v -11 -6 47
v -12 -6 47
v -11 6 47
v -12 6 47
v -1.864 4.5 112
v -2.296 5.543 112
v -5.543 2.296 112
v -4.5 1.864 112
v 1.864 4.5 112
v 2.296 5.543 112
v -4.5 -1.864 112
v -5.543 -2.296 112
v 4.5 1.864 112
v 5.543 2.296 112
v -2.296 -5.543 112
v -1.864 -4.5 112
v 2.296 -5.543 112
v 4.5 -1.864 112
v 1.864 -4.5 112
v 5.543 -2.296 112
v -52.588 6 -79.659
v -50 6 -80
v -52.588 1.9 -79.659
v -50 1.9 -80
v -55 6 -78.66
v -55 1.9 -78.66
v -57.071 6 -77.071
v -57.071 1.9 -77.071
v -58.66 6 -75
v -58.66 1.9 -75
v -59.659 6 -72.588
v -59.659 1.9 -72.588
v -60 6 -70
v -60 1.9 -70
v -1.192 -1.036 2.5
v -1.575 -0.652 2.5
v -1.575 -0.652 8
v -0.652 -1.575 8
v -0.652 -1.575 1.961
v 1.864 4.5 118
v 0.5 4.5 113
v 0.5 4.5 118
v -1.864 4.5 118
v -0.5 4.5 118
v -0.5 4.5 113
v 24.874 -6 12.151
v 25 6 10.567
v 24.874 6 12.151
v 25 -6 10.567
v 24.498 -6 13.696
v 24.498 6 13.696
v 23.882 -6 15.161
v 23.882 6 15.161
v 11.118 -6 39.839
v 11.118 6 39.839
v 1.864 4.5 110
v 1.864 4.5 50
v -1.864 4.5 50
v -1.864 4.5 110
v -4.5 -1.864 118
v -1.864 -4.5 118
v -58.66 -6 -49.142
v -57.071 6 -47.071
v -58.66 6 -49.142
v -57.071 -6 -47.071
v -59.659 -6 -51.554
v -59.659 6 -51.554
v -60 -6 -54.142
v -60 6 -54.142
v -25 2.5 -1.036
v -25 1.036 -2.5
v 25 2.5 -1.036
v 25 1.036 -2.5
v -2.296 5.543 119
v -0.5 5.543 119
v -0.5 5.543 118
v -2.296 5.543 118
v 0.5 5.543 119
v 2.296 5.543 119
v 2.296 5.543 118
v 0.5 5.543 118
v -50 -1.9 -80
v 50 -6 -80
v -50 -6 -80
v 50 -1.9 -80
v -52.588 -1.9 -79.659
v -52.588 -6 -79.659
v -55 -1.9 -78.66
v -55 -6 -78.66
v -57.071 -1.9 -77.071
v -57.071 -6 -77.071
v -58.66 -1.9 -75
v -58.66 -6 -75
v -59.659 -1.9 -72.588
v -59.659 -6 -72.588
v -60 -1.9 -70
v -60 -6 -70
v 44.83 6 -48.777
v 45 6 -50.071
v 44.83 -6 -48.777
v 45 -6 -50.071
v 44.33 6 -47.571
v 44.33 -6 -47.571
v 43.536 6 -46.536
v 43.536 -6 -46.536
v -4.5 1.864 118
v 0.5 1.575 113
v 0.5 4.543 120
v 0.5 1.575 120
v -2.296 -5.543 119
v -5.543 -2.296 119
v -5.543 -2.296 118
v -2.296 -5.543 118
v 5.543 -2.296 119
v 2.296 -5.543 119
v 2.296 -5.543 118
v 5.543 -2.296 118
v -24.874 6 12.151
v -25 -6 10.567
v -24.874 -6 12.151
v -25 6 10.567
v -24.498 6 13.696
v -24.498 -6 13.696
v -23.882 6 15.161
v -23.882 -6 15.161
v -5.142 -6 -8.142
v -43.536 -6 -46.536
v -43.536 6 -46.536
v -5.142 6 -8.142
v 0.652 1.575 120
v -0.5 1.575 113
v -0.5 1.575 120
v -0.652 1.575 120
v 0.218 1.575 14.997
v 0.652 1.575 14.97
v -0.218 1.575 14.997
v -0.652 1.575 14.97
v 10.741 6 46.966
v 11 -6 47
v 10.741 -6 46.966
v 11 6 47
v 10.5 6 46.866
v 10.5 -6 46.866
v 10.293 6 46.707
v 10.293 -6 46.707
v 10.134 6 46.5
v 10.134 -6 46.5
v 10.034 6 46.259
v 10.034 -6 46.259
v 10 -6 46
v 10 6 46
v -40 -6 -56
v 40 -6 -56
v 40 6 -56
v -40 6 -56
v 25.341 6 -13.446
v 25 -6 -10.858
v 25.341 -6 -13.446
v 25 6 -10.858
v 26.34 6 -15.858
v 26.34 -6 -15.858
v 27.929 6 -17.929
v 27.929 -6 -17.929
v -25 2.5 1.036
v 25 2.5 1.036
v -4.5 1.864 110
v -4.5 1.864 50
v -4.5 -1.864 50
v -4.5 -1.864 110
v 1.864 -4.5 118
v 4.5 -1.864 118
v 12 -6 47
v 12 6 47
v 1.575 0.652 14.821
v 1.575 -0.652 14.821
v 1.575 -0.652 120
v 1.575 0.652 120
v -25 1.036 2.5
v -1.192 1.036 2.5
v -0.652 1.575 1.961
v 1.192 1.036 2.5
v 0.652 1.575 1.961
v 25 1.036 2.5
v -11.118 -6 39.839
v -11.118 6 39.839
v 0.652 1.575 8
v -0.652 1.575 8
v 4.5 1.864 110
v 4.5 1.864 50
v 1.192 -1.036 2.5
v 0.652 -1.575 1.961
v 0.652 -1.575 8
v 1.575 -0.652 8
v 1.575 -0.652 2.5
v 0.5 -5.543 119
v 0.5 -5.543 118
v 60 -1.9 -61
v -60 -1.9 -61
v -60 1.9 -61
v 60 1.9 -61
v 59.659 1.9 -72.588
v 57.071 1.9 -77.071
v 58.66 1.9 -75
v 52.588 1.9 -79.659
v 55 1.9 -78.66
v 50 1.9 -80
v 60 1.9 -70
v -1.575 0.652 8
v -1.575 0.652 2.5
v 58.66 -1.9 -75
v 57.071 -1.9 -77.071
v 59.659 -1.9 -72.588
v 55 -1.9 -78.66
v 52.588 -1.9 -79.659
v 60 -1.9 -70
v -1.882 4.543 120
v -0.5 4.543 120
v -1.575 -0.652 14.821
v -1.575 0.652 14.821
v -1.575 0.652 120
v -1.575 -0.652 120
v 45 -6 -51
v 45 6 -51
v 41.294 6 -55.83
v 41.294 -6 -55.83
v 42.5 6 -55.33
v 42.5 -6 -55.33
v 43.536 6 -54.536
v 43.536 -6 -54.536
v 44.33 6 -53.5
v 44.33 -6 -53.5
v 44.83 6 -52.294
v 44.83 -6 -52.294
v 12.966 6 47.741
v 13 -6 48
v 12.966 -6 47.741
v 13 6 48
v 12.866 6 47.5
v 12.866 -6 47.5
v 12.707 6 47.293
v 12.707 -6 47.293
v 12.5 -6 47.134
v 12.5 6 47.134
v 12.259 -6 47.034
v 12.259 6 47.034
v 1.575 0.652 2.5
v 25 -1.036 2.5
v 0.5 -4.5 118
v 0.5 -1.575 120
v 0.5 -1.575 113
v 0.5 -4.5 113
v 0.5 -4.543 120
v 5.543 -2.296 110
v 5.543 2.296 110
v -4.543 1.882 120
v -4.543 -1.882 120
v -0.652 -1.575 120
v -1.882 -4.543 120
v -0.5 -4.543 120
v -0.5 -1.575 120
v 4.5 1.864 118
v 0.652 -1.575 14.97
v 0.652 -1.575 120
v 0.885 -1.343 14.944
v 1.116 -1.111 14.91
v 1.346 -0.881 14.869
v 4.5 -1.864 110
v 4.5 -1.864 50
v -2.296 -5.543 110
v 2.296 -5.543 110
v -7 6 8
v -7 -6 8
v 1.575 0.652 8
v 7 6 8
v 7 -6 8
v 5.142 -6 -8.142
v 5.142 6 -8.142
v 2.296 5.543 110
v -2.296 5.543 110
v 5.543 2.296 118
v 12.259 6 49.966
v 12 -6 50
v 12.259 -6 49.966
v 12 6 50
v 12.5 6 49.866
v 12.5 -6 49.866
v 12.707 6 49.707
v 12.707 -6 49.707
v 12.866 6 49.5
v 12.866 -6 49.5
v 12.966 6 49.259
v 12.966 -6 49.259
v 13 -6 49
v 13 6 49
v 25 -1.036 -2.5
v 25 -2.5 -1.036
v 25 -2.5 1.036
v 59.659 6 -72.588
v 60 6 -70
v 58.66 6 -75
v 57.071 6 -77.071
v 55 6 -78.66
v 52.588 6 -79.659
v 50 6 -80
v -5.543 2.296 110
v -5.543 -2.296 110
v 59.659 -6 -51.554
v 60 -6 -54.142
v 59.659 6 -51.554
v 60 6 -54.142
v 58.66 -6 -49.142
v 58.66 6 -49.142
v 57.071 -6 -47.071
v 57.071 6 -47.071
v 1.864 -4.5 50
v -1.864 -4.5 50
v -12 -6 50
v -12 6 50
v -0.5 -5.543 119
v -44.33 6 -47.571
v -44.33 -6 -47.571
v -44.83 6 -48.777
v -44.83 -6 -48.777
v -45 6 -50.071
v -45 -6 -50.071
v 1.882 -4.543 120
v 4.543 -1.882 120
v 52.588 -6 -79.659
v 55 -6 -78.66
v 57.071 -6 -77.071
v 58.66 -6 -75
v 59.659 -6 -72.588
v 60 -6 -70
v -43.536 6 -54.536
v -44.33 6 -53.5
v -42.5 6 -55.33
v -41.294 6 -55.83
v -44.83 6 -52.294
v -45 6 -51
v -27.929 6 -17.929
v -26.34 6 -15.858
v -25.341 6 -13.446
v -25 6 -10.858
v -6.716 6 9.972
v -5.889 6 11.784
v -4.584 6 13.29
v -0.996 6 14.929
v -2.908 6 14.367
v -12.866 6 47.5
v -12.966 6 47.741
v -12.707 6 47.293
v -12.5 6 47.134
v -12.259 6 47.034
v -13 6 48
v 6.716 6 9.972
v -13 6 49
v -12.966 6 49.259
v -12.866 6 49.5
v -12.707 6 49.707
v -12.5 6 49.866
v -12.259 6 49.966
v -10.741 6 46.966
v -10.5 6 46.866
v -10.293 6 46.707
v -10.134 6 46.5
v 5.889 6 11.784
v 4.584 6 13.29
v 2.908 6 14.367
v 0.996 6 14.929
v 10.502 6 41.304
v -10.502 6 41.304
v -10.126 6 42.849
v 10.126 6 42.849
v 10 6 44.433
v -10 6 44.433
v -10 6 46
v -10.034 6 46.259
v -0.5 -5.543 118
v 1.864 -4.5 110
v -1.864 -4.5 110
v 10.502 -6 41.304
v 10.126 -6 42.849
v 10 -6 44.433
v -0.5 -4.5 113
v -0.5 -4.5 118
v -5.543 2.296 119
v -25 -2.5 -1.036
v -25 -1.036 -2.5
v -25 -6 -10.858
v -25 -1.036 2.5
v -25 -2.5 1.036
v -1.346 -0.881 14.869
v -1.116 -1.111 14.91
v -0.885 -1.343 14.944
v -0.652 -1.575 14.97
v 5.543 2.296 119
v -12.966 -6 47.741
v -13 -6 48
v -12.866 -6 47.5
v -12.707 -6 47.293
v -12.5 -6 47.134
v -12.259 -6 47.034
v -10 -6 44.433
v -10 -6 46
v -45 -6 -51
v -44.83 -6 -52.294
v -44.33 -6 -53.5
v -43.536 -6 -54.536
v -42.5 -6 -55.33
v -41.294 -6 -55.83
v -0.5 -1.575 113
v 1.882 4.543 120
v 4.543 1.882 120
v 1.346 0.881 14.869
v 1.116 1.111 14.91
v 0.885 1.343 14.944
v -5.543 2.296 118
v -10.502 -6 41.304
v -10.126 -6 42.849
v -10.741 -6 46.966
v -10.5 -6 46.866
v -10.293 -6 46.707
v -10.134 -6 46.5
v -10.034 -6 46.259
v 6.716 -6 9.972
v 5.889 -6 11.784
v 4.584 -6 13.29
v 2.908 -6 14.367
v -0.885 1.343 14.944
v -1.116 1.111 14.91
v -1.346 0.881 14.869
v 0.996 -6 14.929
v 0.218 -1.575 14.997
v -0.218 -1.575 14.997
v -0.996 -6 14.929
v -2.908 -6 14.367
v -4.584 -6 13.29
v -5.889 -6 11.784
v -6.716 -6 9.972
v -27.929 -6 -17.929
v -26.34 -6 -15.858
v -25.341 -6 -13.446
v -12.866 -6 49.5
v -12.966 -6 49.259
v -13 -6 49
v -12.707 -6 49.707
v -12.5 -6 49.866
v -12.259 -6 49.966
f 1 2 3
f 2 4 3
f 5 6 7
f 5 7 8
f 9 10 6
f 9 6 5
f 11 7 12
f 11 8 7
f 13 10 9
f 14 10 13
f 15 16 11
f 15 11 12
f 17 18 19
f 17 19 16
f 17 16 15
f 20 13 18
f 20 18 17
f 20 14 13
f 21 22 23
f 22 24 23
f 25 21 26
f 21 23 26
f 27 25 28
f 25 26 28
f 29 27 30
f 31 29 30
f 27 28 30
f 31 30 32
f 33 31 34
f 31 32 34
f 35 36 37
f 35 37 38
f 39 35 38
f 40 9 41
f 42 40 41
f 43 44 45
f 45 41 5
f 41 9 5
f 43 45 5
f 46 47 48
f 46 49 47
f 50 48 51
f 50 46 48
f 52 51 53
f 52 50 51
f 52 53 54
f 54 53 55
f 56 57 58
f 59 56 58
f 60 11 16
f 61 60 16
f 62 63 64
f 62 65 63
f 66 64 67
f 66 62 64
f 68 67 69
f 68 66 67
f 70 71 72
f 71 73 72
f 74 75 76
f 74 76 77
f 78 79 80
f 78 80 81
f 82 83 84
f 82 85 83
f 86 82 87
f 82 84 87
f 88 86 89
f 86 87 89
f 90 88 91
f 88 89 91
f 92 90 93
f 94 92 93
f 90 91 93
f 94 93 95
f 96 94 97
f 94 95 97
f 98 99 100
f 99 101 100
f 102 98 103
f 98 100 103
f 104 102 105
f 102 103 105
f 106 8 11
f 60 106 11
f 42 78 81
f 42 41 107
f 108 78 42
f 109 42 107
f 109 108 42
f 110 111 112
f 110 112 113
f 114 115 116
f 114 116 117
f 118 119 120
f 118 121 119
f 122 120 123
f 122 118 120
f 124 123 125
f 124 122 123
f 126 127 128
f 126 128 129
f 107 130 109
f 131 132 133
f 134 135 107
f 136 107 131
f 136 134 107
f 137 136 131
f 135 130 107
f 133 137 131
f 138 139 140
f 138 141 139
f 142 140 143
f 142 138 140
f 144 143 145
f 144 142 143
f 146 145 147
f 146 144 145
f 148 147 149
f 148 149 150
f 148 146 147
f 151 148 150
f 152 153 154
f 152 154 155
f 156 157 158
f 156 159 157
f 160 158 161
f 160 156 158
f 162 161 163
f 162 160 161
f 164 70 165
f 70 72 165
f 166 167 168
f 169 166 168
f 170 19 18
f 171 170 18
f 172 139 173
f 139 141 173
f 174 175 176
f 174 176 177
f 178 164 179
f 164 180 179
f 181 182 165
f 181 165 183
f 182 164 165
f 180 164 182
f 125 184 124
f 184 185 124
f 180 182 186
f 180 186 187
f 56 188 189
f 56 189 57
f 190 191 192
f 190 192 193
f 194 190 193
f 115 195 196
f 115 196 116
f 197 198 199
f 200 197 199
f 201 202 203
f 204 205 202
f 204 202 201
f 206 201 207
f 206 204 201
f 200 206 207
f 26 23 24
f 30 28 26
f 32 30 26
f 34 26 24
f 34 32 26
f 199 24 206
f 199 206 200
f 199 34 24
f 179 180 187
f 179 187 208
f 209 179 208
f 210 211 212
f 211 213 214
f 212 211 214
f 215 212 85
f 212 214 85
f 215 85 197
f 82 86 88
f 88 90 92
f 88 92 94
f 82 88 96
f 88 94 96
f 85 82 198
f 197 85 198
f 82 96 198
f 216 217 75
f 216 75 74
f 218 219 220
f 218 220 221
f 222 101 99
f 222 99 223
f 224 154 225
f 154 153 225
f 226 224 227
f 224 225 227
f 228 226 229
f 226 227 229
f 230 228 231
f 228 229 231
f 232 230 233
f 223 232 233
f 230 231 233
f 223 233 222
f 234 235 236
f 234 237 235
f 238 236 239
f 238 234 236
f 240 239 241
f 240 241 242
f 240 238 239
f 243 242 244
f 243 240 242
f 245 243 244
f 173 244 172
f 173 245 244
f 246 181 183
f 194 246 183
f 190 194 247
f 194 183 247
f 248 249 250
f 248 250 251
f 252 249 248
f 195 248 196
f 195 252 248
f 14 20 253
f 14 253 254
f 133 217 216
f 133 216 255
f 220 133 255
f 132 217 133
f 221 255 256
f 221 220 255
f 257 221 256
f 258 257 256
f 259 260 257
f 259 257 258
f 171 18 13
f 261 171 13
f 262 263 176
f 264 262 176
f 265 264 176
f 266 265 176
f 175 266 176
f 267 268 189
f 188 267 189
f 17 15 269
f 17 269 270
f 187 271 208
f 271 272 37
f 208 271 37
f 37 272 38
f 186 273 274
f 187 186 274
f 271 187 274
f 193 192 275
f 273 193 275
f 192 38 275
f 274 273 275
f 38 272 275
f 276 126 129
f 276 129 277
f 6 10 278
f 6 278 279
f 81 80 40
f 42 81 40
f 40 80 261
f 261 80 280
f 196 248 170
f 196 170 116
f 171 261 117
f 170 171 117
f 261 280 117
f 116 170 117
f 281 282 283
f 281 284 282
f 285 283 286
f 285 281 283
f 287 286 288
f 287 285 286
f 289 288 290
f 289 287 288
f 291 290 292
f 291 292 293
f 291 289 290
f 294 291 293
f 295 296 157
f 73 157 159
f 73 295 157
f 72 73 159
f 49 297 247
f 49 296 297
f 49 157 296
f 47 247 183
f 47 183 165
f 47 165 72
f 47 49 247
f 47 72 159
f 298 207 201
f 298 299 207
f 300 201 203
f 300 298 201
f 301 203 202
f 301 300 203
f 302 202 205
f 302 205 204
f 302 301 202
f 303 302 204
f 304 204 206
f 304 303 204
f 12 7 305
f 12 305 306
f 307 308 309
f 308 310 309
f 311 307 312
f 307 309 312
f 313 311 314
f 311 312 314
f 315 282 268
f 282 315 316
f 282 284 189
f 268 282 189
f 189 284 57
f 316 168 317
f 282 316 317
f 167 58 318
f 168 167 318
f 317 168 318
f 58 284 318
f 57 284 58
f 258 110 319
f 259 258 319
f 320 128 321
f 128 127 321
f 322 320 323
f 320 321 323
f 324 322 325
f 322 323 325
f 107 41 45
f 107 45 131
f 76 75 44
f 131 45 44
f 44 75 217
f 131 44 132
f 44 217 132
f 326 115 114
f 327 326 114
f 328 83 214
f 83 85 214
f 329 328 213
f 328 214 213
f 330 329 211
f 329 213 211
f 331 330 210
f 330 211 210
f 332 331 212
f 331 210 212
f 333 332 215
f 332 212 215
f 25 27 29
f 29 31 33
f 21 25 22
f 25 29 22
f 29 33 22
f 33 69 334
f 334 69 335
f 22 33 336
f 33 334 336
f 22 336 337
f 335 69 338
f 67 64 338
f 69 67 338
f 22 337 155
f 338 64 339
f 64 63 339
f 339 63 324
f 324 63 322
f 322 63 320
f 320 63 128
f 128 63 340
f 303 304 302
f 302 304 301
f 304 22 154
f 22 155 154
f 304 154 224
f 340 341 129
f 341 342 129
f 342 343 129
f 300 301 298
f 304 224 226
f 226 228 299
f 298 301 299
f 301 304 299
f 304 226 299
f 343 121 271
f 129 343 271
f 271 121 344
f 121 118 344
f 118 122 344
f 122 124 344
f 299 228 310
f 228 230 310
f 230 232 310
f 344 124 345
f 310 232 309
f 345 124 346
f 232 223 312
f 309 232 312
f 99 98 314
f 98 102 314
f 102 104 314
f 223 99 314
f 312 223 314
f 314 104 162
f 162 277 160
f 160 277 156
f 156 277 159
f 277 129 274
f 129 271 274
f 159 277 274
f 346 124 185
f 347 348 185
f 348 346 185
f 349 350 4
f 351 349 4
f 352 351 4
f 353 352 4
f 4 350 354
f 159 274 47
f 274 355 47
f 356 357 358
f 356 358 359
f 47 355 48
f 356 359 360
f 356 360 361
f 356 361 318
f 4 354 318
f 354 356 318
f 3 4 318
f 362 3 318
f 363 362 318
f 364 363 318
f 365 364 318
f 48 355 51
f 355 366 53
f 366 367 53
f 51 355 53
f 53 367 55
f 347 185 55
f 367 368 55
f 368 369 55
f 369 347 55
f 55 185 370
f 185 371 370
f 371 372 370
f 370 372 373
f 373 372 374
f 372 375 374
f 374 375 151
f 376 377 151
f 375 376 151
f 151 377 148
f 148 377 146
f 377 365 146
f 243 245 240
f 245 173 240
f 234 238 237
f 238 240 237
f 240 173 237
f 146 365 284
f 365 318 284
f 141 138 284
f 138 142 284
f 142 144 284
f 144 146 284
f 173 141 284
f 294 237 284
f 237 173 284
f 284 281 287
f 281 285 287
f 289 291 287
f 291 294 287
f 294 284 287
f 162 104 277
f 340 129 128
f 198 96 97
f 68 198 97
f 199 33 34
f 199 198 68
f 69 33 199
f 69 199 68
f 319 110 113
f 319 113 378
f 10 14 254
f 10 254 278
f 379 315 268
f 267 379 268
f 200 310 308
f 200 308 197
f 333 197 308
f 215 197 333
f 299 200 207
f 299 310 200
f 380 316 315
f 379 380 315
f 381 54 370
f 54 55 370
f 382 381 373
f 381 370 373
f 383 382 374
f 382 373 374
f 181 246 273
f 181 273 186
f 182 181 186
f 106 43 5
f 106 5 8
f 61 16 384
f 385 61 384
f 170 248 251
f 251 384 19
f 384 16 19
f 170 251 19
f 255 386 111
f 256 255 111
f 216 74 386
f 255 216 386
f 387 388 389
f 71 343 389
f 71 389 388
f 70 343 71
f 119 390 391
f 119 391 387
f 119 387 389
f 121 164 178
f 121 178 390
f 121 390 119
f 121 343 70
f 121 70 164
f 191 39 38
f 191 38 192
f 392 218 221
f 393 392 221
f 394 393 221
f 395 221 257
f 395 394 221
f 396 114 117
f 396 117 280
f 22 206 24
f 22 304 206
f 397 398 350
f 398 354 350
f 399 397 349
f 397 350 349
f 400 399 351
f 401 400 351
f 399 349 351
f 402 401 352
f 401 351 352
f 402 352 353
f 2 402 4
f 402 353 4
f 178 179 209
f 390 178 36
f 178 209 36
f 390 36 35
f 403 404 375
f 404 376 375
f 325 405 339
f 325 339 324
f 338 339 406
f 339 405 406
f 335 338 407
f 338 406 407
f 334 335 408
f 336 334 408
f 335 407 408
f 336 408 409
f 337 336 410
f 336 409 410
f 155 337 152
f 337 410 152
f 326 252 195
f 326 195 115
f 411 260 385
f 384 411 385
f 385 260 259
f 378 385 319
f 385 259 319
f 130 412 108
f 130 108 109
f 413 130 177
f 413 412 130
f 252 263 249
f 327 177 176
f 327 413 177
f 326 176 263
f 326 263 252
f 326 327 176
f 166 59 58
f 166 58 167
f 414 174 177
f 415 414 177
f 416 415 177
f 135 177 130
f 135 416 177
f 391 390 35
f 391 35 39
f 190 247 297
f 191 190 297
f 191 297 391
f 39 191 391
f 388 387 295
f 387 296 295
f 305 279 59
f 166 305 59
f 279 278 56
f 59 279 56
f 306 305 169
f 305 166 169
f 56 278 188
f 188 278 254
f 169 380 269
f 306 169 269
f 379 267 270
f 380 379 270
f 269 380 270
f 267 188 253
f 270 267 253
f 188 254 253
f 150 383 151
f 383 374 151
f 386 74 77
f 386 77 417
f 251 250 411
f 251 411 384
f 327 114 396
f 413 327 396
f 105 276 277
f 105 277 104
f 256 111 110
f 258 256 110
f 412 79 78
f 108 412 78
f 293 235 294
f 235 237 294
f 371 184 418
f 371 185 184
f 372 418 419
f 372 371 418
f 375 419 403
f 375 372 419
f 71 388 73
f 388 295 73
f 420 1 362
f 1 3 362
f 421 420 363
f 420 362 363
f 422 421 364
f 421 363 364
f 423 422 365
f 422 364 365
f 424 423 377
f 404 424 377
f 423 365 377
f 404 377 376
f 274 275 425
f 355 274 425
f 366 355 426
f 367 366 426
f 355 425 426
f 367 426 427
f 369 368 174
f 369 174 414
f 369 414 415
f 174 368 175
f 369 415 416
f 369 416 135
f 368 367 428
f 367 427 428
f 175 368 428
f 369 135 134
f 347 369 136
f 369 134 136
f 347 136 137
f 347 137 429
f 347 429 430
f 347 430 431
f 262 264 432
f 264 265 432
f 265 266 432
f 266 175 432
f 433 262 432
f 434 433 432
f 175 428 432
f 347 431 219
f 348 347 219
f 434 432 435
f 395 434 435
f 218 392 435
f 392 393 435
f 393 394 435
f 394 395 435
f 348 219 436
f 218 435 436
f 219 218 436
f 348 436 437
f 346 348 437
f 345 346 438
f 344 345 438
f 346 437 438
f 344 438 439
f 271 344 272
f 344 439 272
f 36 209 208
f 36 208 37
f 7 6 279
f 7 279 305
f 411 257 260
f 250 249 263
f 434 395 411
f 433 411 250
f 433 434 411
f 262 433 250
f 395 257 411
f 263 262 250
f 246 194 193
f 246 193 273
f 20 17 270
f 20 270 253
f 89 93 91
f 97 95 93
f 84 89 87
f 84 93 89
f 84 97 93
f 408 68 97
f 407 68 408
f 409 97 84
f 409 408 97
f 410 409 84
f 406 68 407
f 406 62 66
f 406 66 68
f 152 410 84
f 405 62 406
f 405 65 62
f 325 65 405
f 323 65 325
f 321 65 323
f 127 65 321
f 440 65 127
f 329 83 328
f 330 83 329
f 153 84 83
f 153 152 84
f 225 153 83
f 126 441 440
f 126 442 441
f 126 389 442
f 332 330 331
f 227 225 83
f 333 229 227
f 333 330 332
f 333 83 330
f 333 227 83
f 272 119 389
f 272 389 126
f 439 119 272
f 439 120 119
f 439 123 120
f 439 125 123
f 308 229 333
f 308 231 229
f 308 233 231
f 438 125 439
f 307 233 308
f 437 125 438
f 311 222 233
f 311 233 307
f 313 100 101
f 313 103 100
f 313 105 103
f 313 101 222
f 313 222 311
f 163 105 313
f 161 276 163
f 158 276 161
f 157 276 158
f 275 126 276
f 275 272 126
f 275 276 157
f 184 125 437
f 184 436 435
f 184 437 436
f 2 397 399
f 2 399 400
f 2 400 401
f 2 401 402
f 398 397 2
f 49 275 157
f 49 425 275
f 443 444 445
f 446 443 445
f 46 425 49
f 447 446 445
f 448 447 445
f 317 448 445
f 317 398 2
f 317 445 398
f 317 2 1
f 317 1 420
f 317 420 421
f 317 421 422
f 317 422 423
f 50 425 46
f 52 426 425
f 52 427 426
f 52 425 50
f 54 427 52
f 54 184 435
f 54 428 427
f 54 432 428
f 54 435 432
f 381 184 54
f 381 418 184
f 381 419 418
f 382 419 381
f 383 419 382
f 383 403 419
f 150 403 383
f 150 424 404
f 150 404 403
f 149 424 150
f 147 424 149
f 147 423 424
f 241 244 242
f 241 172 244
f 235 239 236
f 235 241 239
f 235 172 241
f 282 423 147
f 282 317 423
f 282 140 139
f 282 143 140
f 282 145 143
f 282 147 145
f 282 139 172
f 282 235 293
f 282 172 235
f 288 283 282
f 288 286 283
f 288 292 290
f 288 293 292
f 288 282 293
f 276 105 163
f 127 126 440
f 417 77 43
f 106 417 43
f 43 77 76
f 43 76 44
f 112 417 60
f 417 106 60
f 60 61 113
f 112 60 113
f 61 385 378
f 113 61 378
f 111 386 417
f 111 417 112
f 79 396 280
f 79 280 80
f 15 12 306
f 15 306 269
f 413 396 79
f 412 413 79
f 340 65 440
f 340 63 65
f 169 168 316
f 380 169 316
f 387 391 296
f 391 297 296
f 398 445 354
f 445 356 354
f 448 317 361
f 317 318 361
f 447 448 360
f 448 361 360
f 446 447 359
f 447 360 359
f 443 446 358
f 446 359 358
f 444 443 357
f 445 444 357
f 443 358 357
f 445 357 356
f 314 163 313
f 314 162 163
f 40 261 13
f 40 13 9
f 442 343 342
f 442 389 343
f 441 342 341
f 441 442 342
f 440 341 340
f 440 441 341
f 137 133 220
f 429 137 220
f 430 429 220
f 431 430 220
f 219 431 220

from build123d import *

# Parameters (mm, degrees)
PAD_DEPTH            = 25
PAD_DEPTH_BACK       = 25
PAD001_START         = 5
PAD001_DEPTH         = 115
PAD002_DEPTH         = 6
PAD002_DEPTH_BACK    = 6
POCKET_DEPTH         = 10.001
POCKET_DEPTH_BACK    = 10.001
POCKET001_DEPTH      = 120.001
PAD003_DEPTH         = 2
LINEARPATTERN_COUNT  = 2
LINEARPATTERN_PITCH  = 8
SKETCH006_W          = 15
SKETCH006_H          = 1
POCKET002_DEPTH      = 7
PAD004_DEPTH         = 6
PAD004_DEPTH_BACK    = 6
SKETCH008_W          = 3.8
SKETCH008_H          = 20
POCKET003_DEPTH      = 60.001
POCKET003_DEPTH_BACK = 60.001
POCKET004_DEPTH      = 10.001
POCKET004_DEPTH_BACK = 10.001
FILLET_R             = 10
FILLET001_R          = 10
FILLET002_R          = 5
FILLET003_R          = 10
FILLET004_R          = 1
FILLET005_R          = 1
SKETCH010_W          = 10
SKETCH010_H          = 30
POCKET005_DEPTH      = 60.001
POCKET005_DEPTH_BACK = 60.001
SKETCH011_W          = 10
SKETCH011_H          = 30
POCKET006_DEPTH      = 60.001
POCKET006_DEPTH_BACK = 60.001
FILLET006_R          = 10
CHAMFER_SIZE         = 1
CHAMFER001_SIZE      = 1


with BuildPart() as part:
    # Sketch → Pad (new body, two sides)
    with BuildSketch(Plane.YZ) as pad_sk:
        Polygon((10, -4.142136), (10, 4.142136), (4.142136, 10), (-4.142136, 10), (-10, 4.142136), (-10, -4.142136), (-4.142136, -10), (4.142136, -10), align=None)
        Polygon((2.5, 1.035534), (1.035534, 2.5), (-1.035534, 2.5), (-2.5, 1.035534), (-2.5, -1.035534), (-1.035534, -2.5), (1.035534, -2.5), (2.5, -1.035534), align=None, mode=Mode.SUBTRACT)
    extrude(amount=PAD_DEPTH)
    extrude(pad_sk.sketch, amount=-PAD_DEPTH_BACK)

    # Sketch001 → Pad001 (join)
    with BuildSketch(Plane.XY.offset(PAD001_START)):
        Polygon((4.5, -1.863961), (4.5, 1.863961), (1.863961, 4.5), (-1.863961, 4.5), (-4.5, 1.863961), (-4.5, -1.863961), (-1.863961, -4.5), (1.863961, -4.5), align=None)
        Polygon((1.575, -0.652386), (1.575, 0.652386), (0.652386, 1.575), (-0.652386, 1.575), (-1.575, 0.652386), (-1.575, -0.652386), (-0.652386, -1.575), (0.652386, -1.575), align=None, mode=Mode.SUBTRACT)
    extrude(amount=PAD001_DEPTH)

    # Sketch002 → Pad002 (join, two sides)
    with BuildSketch(Plane.XZ) as pad002_sk:
        Polygon((-25, 8), (25, 8), (25, 13), (10, 42), (10, 47), (13, 47), (13, 50), (-13, 50), (-13, 47), (-10, 47), (-10, 42), (-25, 13), align=None)
    extrude(amount=PAD002_DEPTH)
    extrude(pad002_sk.sketch, amount=-PAD002_DEPTH_BACK)

    # Sketch003 → Pocket (cut, two sides)
    with BuildSketch(Plane.XZ) as pocket_sk:
        with BuildLine():
            ThreePointArc((7, 8), (0, 15), (-7, 8))
            Line((-7, 8), (7, 8))
        make_face()
    extrude(amount=-POCKET_DEPTH, mode=Mode.SUBTRACT)
    extrude(pocket_sk.sketch, amount=POCKET_DEPTH_BACK, mode=Mode.SUBTRACT)

    # Sketch004 → Pocket001 (cut, through all)
    with BuildSketch(Plane.XY):
        Polygon((1.575, -0.652386), (1.575, 0.652386), (0.652386, 1.575), (-0.652386, 1.575), (-1.575, 0.652386), (-1.575, -0.652386), (-0.652386, -1.575), (0.652386, -1.575), align=None)
    extrude(amount=POCKET001_DEPTH, mode=Mode.SUBTRACT)

    # Sketch005 (on Face68 of Pocket001) → Pad003 (join)
    with BuildSketch(Plane(origin=(0, 0, 120), x_dir=(0, -1, 0), z_dir=(0, 0, 1))):
        Polygon((5.543277, -2.296101), (5.543277, 2.296101), (2.296101, 5.543277), (-2.296101, 5.543277), (-5.543277, 2.296101), (-5.543277, -2.296101), (-2.296101, -5.543277), (2.296101, -5.543277), align=None)
        Polygon((1.339392, -3.233578), (3.233578, -1.339392), (3.233578, 1.339392), (1.339392, 3.233578), (-1.339392, 3.233578), (-3.233578, 1.339392), (-3.233578, -1.339392), (-1.339392, -3.233578), align=None, mode=Mode.SUBTRACT)
    pad003 = extrude(amount=-PAD003_DEPTH)

    # LinearPattern: Pad003 ×2
    with Locations(*[(0, 0, -i * LINEARPATTERN_PITCH) for i in range(1, LINEARPATTERN_COUNT)]):
        add(pad003)

    # Sketch006 (on Face80 of LinearPattern) → Pocket002 (cut)
    with BuildSketch(Plane(origin=(0, 0, 120), x_dir=(0, -1, 0), z_dir=(0, 0, 1))):
        Rectangle(SKETCH006_W, SKETCH006_H)
    extrude(amount=-POCKET002_DEPTH, mode=Mode.SUBTRACT)

    # Sketch007 → Pad004 (join, two sides)
    with BuildSketch(Plane.XZ) as pad004_sk:
        Polygon((-25, -5), (25, -5), (25, -15), (60, -50), (60, -80), (-60, -80), (-60, -50), (-25, -15), align=None)
    extrude(amount=PAD004_DEPTH)
    extrude(pad004_sk.sketch, amount=-PAD004_DEPTH_BACK)

    # Sketch008 → Pocket003 (cut, two sides)
    with BuildSketch(Plane.YZ) as pocket003_sk:
        with Locations((0, -71)):
            Rectangle(SKETCH008_W, SKETCH008_H)
    extrude(amount=-POCKET003_DEPTH, mode=Mode.SUBTRACT)
    extrude(pocket003_sk.sketch, amount=POCKET003_DEPTH_BACK, mode=Mode.SUBTRACT)

    # Sketch009 → Pocket004 (cut, two sides)
    with BuildSketch(Plane.XZ) as pocket004_sk:
        Polygon((-5.142136, -8.142136), (5.142136, -8.142136), (45, -48), (45, -56), (-45, -56), (-45, -48), align=None)
    extrude(amount=-POCKET004_DEPTH, mode=Mode.SUBTRACT)
    extrude(pocket004_sk.sketch, amount=POCKET004_DEPTH_BACK, mode=Mode.SUBTRACT)

    # Fillet
    fillet_edges = [part.edges().sort_by_distance(p)[0] for p in [
        (25, 0, -15),
        (-25, 0, -15),
    ]]
    fillet(fillet_edges, radius=FILLET_R)

    # Fillet001
    fillet001_edges = [part.edges().sort_by_distance(p)[0] for p in [
        (-60, 0, -50),
        (60, 0, -50),
    ]]
    fillet(fillet001_edges, radius=FILLET001_R)

    # Fillet002
    fillet002_edges = [part.edges().sort_by_distance(p)[0] for p in [
        (-45, 0, -56),
        (-45, 0, -48),
        (45, 0, -48),
        (45, 0, -56),
    ]]
    fillet(fillet002_edges, radius=FILLET002_R)

    # Fillet003
    fillet003_edges = [part.edges().sort_by_distance(p)[0] for p in [
        (-25, 0, 13),
        (-10, 0, 42),
        (10, 0, 42),
        (25, 0, 13),
    ]]
    fillet(fillet003_edges, radius=FILLET003_R)

    # Fillet004
    fillet004_edges = [part.edges().sort_by_distance(p)[0] for p in [
        (10, 0, 47),
        (13, 0, 47),
        (13, 0, 50),
    ]]
    fillet(fillet004_edges, radius=FILLET004_R)

    # Fillet005
    fillet005_edges = [part.edges().sort_by_distance(p)[0] for p in [
        (-10, 0, 47),
        (-13, 0, 47),
        (-13, 0, 50),
    ]]
    fillet(fillet005_edges, radius=FILLET005_R)

    # Sketch010 → Pocket005 (cut, two sides)
    with BuildSketch(Plane.YZ) as pocket005_sk:
        with Locations((11, 0)):
            Rectangle(SKETCH010_W, SKETCH010_H)
    extrude(amount=-POCKET005_DEPTH, mode=Mode.SUBTRACT)
    extrude(pocket005_sk.sketch, amount=POCKET005_DEPTH_BACK, mode=Mode.SUBTRACT)

    # Sketch011 → Pocket006 (cut, two sides)
    with BuildSketch(Plane.YZ) as pocket006_sk:
        with Locations((-11, 0)):
            Rectangle(SKETCH011_W, SKETCH011_H)
    extrude(amount=-POCKET006_DEPTH, mode=Mode.SUBTRACT)
    extrude(pocket006_sk.sketch, amount=POCKET006_DEPTH_BACK, mode=Mode.SUBTRACT)

    # Fillet006
    fillet006_edges = [part.edges().sort_by_distance(p)[0] for p in [
        (60, -3.95, -80),
        (60, 3.95, -80),
        (-60, -3.95, -80),
        (-60, 3.95, -80),
    ]]
    fillet(fillet006_edges, radius=FILLET006_R)

    # Chamfer
    chamfer_edges = [part.edges().sort_by_distance(p)[0] for p in [
        (1.39805, 5.543277, 120),
        (3.919689, 3.919689, 120),
        (5.543277, 0, 120),
        (3.919689, -3.919689, 120),
        (1.39805, -5.543277, 120),
    ]]
    chamfer(chamfer_edges, length=CHAMFER_SIZE)

    # Chamfer001
    chamfer001_edges = [part.edges().sort_by_distance(p)[0] for p in [
        (-1.39805, 5.543277, 120),
        (-3.919689, 3.919689, 120),
        (-5.543277, 0, 120),
        (-3.919689, -3.919689, 120),
        (-1.39805, -5.543277, 120),
    ]]
    chamfer(chamfer001_edges, length=CHAMFER001_SIZE)


solid = part.part
